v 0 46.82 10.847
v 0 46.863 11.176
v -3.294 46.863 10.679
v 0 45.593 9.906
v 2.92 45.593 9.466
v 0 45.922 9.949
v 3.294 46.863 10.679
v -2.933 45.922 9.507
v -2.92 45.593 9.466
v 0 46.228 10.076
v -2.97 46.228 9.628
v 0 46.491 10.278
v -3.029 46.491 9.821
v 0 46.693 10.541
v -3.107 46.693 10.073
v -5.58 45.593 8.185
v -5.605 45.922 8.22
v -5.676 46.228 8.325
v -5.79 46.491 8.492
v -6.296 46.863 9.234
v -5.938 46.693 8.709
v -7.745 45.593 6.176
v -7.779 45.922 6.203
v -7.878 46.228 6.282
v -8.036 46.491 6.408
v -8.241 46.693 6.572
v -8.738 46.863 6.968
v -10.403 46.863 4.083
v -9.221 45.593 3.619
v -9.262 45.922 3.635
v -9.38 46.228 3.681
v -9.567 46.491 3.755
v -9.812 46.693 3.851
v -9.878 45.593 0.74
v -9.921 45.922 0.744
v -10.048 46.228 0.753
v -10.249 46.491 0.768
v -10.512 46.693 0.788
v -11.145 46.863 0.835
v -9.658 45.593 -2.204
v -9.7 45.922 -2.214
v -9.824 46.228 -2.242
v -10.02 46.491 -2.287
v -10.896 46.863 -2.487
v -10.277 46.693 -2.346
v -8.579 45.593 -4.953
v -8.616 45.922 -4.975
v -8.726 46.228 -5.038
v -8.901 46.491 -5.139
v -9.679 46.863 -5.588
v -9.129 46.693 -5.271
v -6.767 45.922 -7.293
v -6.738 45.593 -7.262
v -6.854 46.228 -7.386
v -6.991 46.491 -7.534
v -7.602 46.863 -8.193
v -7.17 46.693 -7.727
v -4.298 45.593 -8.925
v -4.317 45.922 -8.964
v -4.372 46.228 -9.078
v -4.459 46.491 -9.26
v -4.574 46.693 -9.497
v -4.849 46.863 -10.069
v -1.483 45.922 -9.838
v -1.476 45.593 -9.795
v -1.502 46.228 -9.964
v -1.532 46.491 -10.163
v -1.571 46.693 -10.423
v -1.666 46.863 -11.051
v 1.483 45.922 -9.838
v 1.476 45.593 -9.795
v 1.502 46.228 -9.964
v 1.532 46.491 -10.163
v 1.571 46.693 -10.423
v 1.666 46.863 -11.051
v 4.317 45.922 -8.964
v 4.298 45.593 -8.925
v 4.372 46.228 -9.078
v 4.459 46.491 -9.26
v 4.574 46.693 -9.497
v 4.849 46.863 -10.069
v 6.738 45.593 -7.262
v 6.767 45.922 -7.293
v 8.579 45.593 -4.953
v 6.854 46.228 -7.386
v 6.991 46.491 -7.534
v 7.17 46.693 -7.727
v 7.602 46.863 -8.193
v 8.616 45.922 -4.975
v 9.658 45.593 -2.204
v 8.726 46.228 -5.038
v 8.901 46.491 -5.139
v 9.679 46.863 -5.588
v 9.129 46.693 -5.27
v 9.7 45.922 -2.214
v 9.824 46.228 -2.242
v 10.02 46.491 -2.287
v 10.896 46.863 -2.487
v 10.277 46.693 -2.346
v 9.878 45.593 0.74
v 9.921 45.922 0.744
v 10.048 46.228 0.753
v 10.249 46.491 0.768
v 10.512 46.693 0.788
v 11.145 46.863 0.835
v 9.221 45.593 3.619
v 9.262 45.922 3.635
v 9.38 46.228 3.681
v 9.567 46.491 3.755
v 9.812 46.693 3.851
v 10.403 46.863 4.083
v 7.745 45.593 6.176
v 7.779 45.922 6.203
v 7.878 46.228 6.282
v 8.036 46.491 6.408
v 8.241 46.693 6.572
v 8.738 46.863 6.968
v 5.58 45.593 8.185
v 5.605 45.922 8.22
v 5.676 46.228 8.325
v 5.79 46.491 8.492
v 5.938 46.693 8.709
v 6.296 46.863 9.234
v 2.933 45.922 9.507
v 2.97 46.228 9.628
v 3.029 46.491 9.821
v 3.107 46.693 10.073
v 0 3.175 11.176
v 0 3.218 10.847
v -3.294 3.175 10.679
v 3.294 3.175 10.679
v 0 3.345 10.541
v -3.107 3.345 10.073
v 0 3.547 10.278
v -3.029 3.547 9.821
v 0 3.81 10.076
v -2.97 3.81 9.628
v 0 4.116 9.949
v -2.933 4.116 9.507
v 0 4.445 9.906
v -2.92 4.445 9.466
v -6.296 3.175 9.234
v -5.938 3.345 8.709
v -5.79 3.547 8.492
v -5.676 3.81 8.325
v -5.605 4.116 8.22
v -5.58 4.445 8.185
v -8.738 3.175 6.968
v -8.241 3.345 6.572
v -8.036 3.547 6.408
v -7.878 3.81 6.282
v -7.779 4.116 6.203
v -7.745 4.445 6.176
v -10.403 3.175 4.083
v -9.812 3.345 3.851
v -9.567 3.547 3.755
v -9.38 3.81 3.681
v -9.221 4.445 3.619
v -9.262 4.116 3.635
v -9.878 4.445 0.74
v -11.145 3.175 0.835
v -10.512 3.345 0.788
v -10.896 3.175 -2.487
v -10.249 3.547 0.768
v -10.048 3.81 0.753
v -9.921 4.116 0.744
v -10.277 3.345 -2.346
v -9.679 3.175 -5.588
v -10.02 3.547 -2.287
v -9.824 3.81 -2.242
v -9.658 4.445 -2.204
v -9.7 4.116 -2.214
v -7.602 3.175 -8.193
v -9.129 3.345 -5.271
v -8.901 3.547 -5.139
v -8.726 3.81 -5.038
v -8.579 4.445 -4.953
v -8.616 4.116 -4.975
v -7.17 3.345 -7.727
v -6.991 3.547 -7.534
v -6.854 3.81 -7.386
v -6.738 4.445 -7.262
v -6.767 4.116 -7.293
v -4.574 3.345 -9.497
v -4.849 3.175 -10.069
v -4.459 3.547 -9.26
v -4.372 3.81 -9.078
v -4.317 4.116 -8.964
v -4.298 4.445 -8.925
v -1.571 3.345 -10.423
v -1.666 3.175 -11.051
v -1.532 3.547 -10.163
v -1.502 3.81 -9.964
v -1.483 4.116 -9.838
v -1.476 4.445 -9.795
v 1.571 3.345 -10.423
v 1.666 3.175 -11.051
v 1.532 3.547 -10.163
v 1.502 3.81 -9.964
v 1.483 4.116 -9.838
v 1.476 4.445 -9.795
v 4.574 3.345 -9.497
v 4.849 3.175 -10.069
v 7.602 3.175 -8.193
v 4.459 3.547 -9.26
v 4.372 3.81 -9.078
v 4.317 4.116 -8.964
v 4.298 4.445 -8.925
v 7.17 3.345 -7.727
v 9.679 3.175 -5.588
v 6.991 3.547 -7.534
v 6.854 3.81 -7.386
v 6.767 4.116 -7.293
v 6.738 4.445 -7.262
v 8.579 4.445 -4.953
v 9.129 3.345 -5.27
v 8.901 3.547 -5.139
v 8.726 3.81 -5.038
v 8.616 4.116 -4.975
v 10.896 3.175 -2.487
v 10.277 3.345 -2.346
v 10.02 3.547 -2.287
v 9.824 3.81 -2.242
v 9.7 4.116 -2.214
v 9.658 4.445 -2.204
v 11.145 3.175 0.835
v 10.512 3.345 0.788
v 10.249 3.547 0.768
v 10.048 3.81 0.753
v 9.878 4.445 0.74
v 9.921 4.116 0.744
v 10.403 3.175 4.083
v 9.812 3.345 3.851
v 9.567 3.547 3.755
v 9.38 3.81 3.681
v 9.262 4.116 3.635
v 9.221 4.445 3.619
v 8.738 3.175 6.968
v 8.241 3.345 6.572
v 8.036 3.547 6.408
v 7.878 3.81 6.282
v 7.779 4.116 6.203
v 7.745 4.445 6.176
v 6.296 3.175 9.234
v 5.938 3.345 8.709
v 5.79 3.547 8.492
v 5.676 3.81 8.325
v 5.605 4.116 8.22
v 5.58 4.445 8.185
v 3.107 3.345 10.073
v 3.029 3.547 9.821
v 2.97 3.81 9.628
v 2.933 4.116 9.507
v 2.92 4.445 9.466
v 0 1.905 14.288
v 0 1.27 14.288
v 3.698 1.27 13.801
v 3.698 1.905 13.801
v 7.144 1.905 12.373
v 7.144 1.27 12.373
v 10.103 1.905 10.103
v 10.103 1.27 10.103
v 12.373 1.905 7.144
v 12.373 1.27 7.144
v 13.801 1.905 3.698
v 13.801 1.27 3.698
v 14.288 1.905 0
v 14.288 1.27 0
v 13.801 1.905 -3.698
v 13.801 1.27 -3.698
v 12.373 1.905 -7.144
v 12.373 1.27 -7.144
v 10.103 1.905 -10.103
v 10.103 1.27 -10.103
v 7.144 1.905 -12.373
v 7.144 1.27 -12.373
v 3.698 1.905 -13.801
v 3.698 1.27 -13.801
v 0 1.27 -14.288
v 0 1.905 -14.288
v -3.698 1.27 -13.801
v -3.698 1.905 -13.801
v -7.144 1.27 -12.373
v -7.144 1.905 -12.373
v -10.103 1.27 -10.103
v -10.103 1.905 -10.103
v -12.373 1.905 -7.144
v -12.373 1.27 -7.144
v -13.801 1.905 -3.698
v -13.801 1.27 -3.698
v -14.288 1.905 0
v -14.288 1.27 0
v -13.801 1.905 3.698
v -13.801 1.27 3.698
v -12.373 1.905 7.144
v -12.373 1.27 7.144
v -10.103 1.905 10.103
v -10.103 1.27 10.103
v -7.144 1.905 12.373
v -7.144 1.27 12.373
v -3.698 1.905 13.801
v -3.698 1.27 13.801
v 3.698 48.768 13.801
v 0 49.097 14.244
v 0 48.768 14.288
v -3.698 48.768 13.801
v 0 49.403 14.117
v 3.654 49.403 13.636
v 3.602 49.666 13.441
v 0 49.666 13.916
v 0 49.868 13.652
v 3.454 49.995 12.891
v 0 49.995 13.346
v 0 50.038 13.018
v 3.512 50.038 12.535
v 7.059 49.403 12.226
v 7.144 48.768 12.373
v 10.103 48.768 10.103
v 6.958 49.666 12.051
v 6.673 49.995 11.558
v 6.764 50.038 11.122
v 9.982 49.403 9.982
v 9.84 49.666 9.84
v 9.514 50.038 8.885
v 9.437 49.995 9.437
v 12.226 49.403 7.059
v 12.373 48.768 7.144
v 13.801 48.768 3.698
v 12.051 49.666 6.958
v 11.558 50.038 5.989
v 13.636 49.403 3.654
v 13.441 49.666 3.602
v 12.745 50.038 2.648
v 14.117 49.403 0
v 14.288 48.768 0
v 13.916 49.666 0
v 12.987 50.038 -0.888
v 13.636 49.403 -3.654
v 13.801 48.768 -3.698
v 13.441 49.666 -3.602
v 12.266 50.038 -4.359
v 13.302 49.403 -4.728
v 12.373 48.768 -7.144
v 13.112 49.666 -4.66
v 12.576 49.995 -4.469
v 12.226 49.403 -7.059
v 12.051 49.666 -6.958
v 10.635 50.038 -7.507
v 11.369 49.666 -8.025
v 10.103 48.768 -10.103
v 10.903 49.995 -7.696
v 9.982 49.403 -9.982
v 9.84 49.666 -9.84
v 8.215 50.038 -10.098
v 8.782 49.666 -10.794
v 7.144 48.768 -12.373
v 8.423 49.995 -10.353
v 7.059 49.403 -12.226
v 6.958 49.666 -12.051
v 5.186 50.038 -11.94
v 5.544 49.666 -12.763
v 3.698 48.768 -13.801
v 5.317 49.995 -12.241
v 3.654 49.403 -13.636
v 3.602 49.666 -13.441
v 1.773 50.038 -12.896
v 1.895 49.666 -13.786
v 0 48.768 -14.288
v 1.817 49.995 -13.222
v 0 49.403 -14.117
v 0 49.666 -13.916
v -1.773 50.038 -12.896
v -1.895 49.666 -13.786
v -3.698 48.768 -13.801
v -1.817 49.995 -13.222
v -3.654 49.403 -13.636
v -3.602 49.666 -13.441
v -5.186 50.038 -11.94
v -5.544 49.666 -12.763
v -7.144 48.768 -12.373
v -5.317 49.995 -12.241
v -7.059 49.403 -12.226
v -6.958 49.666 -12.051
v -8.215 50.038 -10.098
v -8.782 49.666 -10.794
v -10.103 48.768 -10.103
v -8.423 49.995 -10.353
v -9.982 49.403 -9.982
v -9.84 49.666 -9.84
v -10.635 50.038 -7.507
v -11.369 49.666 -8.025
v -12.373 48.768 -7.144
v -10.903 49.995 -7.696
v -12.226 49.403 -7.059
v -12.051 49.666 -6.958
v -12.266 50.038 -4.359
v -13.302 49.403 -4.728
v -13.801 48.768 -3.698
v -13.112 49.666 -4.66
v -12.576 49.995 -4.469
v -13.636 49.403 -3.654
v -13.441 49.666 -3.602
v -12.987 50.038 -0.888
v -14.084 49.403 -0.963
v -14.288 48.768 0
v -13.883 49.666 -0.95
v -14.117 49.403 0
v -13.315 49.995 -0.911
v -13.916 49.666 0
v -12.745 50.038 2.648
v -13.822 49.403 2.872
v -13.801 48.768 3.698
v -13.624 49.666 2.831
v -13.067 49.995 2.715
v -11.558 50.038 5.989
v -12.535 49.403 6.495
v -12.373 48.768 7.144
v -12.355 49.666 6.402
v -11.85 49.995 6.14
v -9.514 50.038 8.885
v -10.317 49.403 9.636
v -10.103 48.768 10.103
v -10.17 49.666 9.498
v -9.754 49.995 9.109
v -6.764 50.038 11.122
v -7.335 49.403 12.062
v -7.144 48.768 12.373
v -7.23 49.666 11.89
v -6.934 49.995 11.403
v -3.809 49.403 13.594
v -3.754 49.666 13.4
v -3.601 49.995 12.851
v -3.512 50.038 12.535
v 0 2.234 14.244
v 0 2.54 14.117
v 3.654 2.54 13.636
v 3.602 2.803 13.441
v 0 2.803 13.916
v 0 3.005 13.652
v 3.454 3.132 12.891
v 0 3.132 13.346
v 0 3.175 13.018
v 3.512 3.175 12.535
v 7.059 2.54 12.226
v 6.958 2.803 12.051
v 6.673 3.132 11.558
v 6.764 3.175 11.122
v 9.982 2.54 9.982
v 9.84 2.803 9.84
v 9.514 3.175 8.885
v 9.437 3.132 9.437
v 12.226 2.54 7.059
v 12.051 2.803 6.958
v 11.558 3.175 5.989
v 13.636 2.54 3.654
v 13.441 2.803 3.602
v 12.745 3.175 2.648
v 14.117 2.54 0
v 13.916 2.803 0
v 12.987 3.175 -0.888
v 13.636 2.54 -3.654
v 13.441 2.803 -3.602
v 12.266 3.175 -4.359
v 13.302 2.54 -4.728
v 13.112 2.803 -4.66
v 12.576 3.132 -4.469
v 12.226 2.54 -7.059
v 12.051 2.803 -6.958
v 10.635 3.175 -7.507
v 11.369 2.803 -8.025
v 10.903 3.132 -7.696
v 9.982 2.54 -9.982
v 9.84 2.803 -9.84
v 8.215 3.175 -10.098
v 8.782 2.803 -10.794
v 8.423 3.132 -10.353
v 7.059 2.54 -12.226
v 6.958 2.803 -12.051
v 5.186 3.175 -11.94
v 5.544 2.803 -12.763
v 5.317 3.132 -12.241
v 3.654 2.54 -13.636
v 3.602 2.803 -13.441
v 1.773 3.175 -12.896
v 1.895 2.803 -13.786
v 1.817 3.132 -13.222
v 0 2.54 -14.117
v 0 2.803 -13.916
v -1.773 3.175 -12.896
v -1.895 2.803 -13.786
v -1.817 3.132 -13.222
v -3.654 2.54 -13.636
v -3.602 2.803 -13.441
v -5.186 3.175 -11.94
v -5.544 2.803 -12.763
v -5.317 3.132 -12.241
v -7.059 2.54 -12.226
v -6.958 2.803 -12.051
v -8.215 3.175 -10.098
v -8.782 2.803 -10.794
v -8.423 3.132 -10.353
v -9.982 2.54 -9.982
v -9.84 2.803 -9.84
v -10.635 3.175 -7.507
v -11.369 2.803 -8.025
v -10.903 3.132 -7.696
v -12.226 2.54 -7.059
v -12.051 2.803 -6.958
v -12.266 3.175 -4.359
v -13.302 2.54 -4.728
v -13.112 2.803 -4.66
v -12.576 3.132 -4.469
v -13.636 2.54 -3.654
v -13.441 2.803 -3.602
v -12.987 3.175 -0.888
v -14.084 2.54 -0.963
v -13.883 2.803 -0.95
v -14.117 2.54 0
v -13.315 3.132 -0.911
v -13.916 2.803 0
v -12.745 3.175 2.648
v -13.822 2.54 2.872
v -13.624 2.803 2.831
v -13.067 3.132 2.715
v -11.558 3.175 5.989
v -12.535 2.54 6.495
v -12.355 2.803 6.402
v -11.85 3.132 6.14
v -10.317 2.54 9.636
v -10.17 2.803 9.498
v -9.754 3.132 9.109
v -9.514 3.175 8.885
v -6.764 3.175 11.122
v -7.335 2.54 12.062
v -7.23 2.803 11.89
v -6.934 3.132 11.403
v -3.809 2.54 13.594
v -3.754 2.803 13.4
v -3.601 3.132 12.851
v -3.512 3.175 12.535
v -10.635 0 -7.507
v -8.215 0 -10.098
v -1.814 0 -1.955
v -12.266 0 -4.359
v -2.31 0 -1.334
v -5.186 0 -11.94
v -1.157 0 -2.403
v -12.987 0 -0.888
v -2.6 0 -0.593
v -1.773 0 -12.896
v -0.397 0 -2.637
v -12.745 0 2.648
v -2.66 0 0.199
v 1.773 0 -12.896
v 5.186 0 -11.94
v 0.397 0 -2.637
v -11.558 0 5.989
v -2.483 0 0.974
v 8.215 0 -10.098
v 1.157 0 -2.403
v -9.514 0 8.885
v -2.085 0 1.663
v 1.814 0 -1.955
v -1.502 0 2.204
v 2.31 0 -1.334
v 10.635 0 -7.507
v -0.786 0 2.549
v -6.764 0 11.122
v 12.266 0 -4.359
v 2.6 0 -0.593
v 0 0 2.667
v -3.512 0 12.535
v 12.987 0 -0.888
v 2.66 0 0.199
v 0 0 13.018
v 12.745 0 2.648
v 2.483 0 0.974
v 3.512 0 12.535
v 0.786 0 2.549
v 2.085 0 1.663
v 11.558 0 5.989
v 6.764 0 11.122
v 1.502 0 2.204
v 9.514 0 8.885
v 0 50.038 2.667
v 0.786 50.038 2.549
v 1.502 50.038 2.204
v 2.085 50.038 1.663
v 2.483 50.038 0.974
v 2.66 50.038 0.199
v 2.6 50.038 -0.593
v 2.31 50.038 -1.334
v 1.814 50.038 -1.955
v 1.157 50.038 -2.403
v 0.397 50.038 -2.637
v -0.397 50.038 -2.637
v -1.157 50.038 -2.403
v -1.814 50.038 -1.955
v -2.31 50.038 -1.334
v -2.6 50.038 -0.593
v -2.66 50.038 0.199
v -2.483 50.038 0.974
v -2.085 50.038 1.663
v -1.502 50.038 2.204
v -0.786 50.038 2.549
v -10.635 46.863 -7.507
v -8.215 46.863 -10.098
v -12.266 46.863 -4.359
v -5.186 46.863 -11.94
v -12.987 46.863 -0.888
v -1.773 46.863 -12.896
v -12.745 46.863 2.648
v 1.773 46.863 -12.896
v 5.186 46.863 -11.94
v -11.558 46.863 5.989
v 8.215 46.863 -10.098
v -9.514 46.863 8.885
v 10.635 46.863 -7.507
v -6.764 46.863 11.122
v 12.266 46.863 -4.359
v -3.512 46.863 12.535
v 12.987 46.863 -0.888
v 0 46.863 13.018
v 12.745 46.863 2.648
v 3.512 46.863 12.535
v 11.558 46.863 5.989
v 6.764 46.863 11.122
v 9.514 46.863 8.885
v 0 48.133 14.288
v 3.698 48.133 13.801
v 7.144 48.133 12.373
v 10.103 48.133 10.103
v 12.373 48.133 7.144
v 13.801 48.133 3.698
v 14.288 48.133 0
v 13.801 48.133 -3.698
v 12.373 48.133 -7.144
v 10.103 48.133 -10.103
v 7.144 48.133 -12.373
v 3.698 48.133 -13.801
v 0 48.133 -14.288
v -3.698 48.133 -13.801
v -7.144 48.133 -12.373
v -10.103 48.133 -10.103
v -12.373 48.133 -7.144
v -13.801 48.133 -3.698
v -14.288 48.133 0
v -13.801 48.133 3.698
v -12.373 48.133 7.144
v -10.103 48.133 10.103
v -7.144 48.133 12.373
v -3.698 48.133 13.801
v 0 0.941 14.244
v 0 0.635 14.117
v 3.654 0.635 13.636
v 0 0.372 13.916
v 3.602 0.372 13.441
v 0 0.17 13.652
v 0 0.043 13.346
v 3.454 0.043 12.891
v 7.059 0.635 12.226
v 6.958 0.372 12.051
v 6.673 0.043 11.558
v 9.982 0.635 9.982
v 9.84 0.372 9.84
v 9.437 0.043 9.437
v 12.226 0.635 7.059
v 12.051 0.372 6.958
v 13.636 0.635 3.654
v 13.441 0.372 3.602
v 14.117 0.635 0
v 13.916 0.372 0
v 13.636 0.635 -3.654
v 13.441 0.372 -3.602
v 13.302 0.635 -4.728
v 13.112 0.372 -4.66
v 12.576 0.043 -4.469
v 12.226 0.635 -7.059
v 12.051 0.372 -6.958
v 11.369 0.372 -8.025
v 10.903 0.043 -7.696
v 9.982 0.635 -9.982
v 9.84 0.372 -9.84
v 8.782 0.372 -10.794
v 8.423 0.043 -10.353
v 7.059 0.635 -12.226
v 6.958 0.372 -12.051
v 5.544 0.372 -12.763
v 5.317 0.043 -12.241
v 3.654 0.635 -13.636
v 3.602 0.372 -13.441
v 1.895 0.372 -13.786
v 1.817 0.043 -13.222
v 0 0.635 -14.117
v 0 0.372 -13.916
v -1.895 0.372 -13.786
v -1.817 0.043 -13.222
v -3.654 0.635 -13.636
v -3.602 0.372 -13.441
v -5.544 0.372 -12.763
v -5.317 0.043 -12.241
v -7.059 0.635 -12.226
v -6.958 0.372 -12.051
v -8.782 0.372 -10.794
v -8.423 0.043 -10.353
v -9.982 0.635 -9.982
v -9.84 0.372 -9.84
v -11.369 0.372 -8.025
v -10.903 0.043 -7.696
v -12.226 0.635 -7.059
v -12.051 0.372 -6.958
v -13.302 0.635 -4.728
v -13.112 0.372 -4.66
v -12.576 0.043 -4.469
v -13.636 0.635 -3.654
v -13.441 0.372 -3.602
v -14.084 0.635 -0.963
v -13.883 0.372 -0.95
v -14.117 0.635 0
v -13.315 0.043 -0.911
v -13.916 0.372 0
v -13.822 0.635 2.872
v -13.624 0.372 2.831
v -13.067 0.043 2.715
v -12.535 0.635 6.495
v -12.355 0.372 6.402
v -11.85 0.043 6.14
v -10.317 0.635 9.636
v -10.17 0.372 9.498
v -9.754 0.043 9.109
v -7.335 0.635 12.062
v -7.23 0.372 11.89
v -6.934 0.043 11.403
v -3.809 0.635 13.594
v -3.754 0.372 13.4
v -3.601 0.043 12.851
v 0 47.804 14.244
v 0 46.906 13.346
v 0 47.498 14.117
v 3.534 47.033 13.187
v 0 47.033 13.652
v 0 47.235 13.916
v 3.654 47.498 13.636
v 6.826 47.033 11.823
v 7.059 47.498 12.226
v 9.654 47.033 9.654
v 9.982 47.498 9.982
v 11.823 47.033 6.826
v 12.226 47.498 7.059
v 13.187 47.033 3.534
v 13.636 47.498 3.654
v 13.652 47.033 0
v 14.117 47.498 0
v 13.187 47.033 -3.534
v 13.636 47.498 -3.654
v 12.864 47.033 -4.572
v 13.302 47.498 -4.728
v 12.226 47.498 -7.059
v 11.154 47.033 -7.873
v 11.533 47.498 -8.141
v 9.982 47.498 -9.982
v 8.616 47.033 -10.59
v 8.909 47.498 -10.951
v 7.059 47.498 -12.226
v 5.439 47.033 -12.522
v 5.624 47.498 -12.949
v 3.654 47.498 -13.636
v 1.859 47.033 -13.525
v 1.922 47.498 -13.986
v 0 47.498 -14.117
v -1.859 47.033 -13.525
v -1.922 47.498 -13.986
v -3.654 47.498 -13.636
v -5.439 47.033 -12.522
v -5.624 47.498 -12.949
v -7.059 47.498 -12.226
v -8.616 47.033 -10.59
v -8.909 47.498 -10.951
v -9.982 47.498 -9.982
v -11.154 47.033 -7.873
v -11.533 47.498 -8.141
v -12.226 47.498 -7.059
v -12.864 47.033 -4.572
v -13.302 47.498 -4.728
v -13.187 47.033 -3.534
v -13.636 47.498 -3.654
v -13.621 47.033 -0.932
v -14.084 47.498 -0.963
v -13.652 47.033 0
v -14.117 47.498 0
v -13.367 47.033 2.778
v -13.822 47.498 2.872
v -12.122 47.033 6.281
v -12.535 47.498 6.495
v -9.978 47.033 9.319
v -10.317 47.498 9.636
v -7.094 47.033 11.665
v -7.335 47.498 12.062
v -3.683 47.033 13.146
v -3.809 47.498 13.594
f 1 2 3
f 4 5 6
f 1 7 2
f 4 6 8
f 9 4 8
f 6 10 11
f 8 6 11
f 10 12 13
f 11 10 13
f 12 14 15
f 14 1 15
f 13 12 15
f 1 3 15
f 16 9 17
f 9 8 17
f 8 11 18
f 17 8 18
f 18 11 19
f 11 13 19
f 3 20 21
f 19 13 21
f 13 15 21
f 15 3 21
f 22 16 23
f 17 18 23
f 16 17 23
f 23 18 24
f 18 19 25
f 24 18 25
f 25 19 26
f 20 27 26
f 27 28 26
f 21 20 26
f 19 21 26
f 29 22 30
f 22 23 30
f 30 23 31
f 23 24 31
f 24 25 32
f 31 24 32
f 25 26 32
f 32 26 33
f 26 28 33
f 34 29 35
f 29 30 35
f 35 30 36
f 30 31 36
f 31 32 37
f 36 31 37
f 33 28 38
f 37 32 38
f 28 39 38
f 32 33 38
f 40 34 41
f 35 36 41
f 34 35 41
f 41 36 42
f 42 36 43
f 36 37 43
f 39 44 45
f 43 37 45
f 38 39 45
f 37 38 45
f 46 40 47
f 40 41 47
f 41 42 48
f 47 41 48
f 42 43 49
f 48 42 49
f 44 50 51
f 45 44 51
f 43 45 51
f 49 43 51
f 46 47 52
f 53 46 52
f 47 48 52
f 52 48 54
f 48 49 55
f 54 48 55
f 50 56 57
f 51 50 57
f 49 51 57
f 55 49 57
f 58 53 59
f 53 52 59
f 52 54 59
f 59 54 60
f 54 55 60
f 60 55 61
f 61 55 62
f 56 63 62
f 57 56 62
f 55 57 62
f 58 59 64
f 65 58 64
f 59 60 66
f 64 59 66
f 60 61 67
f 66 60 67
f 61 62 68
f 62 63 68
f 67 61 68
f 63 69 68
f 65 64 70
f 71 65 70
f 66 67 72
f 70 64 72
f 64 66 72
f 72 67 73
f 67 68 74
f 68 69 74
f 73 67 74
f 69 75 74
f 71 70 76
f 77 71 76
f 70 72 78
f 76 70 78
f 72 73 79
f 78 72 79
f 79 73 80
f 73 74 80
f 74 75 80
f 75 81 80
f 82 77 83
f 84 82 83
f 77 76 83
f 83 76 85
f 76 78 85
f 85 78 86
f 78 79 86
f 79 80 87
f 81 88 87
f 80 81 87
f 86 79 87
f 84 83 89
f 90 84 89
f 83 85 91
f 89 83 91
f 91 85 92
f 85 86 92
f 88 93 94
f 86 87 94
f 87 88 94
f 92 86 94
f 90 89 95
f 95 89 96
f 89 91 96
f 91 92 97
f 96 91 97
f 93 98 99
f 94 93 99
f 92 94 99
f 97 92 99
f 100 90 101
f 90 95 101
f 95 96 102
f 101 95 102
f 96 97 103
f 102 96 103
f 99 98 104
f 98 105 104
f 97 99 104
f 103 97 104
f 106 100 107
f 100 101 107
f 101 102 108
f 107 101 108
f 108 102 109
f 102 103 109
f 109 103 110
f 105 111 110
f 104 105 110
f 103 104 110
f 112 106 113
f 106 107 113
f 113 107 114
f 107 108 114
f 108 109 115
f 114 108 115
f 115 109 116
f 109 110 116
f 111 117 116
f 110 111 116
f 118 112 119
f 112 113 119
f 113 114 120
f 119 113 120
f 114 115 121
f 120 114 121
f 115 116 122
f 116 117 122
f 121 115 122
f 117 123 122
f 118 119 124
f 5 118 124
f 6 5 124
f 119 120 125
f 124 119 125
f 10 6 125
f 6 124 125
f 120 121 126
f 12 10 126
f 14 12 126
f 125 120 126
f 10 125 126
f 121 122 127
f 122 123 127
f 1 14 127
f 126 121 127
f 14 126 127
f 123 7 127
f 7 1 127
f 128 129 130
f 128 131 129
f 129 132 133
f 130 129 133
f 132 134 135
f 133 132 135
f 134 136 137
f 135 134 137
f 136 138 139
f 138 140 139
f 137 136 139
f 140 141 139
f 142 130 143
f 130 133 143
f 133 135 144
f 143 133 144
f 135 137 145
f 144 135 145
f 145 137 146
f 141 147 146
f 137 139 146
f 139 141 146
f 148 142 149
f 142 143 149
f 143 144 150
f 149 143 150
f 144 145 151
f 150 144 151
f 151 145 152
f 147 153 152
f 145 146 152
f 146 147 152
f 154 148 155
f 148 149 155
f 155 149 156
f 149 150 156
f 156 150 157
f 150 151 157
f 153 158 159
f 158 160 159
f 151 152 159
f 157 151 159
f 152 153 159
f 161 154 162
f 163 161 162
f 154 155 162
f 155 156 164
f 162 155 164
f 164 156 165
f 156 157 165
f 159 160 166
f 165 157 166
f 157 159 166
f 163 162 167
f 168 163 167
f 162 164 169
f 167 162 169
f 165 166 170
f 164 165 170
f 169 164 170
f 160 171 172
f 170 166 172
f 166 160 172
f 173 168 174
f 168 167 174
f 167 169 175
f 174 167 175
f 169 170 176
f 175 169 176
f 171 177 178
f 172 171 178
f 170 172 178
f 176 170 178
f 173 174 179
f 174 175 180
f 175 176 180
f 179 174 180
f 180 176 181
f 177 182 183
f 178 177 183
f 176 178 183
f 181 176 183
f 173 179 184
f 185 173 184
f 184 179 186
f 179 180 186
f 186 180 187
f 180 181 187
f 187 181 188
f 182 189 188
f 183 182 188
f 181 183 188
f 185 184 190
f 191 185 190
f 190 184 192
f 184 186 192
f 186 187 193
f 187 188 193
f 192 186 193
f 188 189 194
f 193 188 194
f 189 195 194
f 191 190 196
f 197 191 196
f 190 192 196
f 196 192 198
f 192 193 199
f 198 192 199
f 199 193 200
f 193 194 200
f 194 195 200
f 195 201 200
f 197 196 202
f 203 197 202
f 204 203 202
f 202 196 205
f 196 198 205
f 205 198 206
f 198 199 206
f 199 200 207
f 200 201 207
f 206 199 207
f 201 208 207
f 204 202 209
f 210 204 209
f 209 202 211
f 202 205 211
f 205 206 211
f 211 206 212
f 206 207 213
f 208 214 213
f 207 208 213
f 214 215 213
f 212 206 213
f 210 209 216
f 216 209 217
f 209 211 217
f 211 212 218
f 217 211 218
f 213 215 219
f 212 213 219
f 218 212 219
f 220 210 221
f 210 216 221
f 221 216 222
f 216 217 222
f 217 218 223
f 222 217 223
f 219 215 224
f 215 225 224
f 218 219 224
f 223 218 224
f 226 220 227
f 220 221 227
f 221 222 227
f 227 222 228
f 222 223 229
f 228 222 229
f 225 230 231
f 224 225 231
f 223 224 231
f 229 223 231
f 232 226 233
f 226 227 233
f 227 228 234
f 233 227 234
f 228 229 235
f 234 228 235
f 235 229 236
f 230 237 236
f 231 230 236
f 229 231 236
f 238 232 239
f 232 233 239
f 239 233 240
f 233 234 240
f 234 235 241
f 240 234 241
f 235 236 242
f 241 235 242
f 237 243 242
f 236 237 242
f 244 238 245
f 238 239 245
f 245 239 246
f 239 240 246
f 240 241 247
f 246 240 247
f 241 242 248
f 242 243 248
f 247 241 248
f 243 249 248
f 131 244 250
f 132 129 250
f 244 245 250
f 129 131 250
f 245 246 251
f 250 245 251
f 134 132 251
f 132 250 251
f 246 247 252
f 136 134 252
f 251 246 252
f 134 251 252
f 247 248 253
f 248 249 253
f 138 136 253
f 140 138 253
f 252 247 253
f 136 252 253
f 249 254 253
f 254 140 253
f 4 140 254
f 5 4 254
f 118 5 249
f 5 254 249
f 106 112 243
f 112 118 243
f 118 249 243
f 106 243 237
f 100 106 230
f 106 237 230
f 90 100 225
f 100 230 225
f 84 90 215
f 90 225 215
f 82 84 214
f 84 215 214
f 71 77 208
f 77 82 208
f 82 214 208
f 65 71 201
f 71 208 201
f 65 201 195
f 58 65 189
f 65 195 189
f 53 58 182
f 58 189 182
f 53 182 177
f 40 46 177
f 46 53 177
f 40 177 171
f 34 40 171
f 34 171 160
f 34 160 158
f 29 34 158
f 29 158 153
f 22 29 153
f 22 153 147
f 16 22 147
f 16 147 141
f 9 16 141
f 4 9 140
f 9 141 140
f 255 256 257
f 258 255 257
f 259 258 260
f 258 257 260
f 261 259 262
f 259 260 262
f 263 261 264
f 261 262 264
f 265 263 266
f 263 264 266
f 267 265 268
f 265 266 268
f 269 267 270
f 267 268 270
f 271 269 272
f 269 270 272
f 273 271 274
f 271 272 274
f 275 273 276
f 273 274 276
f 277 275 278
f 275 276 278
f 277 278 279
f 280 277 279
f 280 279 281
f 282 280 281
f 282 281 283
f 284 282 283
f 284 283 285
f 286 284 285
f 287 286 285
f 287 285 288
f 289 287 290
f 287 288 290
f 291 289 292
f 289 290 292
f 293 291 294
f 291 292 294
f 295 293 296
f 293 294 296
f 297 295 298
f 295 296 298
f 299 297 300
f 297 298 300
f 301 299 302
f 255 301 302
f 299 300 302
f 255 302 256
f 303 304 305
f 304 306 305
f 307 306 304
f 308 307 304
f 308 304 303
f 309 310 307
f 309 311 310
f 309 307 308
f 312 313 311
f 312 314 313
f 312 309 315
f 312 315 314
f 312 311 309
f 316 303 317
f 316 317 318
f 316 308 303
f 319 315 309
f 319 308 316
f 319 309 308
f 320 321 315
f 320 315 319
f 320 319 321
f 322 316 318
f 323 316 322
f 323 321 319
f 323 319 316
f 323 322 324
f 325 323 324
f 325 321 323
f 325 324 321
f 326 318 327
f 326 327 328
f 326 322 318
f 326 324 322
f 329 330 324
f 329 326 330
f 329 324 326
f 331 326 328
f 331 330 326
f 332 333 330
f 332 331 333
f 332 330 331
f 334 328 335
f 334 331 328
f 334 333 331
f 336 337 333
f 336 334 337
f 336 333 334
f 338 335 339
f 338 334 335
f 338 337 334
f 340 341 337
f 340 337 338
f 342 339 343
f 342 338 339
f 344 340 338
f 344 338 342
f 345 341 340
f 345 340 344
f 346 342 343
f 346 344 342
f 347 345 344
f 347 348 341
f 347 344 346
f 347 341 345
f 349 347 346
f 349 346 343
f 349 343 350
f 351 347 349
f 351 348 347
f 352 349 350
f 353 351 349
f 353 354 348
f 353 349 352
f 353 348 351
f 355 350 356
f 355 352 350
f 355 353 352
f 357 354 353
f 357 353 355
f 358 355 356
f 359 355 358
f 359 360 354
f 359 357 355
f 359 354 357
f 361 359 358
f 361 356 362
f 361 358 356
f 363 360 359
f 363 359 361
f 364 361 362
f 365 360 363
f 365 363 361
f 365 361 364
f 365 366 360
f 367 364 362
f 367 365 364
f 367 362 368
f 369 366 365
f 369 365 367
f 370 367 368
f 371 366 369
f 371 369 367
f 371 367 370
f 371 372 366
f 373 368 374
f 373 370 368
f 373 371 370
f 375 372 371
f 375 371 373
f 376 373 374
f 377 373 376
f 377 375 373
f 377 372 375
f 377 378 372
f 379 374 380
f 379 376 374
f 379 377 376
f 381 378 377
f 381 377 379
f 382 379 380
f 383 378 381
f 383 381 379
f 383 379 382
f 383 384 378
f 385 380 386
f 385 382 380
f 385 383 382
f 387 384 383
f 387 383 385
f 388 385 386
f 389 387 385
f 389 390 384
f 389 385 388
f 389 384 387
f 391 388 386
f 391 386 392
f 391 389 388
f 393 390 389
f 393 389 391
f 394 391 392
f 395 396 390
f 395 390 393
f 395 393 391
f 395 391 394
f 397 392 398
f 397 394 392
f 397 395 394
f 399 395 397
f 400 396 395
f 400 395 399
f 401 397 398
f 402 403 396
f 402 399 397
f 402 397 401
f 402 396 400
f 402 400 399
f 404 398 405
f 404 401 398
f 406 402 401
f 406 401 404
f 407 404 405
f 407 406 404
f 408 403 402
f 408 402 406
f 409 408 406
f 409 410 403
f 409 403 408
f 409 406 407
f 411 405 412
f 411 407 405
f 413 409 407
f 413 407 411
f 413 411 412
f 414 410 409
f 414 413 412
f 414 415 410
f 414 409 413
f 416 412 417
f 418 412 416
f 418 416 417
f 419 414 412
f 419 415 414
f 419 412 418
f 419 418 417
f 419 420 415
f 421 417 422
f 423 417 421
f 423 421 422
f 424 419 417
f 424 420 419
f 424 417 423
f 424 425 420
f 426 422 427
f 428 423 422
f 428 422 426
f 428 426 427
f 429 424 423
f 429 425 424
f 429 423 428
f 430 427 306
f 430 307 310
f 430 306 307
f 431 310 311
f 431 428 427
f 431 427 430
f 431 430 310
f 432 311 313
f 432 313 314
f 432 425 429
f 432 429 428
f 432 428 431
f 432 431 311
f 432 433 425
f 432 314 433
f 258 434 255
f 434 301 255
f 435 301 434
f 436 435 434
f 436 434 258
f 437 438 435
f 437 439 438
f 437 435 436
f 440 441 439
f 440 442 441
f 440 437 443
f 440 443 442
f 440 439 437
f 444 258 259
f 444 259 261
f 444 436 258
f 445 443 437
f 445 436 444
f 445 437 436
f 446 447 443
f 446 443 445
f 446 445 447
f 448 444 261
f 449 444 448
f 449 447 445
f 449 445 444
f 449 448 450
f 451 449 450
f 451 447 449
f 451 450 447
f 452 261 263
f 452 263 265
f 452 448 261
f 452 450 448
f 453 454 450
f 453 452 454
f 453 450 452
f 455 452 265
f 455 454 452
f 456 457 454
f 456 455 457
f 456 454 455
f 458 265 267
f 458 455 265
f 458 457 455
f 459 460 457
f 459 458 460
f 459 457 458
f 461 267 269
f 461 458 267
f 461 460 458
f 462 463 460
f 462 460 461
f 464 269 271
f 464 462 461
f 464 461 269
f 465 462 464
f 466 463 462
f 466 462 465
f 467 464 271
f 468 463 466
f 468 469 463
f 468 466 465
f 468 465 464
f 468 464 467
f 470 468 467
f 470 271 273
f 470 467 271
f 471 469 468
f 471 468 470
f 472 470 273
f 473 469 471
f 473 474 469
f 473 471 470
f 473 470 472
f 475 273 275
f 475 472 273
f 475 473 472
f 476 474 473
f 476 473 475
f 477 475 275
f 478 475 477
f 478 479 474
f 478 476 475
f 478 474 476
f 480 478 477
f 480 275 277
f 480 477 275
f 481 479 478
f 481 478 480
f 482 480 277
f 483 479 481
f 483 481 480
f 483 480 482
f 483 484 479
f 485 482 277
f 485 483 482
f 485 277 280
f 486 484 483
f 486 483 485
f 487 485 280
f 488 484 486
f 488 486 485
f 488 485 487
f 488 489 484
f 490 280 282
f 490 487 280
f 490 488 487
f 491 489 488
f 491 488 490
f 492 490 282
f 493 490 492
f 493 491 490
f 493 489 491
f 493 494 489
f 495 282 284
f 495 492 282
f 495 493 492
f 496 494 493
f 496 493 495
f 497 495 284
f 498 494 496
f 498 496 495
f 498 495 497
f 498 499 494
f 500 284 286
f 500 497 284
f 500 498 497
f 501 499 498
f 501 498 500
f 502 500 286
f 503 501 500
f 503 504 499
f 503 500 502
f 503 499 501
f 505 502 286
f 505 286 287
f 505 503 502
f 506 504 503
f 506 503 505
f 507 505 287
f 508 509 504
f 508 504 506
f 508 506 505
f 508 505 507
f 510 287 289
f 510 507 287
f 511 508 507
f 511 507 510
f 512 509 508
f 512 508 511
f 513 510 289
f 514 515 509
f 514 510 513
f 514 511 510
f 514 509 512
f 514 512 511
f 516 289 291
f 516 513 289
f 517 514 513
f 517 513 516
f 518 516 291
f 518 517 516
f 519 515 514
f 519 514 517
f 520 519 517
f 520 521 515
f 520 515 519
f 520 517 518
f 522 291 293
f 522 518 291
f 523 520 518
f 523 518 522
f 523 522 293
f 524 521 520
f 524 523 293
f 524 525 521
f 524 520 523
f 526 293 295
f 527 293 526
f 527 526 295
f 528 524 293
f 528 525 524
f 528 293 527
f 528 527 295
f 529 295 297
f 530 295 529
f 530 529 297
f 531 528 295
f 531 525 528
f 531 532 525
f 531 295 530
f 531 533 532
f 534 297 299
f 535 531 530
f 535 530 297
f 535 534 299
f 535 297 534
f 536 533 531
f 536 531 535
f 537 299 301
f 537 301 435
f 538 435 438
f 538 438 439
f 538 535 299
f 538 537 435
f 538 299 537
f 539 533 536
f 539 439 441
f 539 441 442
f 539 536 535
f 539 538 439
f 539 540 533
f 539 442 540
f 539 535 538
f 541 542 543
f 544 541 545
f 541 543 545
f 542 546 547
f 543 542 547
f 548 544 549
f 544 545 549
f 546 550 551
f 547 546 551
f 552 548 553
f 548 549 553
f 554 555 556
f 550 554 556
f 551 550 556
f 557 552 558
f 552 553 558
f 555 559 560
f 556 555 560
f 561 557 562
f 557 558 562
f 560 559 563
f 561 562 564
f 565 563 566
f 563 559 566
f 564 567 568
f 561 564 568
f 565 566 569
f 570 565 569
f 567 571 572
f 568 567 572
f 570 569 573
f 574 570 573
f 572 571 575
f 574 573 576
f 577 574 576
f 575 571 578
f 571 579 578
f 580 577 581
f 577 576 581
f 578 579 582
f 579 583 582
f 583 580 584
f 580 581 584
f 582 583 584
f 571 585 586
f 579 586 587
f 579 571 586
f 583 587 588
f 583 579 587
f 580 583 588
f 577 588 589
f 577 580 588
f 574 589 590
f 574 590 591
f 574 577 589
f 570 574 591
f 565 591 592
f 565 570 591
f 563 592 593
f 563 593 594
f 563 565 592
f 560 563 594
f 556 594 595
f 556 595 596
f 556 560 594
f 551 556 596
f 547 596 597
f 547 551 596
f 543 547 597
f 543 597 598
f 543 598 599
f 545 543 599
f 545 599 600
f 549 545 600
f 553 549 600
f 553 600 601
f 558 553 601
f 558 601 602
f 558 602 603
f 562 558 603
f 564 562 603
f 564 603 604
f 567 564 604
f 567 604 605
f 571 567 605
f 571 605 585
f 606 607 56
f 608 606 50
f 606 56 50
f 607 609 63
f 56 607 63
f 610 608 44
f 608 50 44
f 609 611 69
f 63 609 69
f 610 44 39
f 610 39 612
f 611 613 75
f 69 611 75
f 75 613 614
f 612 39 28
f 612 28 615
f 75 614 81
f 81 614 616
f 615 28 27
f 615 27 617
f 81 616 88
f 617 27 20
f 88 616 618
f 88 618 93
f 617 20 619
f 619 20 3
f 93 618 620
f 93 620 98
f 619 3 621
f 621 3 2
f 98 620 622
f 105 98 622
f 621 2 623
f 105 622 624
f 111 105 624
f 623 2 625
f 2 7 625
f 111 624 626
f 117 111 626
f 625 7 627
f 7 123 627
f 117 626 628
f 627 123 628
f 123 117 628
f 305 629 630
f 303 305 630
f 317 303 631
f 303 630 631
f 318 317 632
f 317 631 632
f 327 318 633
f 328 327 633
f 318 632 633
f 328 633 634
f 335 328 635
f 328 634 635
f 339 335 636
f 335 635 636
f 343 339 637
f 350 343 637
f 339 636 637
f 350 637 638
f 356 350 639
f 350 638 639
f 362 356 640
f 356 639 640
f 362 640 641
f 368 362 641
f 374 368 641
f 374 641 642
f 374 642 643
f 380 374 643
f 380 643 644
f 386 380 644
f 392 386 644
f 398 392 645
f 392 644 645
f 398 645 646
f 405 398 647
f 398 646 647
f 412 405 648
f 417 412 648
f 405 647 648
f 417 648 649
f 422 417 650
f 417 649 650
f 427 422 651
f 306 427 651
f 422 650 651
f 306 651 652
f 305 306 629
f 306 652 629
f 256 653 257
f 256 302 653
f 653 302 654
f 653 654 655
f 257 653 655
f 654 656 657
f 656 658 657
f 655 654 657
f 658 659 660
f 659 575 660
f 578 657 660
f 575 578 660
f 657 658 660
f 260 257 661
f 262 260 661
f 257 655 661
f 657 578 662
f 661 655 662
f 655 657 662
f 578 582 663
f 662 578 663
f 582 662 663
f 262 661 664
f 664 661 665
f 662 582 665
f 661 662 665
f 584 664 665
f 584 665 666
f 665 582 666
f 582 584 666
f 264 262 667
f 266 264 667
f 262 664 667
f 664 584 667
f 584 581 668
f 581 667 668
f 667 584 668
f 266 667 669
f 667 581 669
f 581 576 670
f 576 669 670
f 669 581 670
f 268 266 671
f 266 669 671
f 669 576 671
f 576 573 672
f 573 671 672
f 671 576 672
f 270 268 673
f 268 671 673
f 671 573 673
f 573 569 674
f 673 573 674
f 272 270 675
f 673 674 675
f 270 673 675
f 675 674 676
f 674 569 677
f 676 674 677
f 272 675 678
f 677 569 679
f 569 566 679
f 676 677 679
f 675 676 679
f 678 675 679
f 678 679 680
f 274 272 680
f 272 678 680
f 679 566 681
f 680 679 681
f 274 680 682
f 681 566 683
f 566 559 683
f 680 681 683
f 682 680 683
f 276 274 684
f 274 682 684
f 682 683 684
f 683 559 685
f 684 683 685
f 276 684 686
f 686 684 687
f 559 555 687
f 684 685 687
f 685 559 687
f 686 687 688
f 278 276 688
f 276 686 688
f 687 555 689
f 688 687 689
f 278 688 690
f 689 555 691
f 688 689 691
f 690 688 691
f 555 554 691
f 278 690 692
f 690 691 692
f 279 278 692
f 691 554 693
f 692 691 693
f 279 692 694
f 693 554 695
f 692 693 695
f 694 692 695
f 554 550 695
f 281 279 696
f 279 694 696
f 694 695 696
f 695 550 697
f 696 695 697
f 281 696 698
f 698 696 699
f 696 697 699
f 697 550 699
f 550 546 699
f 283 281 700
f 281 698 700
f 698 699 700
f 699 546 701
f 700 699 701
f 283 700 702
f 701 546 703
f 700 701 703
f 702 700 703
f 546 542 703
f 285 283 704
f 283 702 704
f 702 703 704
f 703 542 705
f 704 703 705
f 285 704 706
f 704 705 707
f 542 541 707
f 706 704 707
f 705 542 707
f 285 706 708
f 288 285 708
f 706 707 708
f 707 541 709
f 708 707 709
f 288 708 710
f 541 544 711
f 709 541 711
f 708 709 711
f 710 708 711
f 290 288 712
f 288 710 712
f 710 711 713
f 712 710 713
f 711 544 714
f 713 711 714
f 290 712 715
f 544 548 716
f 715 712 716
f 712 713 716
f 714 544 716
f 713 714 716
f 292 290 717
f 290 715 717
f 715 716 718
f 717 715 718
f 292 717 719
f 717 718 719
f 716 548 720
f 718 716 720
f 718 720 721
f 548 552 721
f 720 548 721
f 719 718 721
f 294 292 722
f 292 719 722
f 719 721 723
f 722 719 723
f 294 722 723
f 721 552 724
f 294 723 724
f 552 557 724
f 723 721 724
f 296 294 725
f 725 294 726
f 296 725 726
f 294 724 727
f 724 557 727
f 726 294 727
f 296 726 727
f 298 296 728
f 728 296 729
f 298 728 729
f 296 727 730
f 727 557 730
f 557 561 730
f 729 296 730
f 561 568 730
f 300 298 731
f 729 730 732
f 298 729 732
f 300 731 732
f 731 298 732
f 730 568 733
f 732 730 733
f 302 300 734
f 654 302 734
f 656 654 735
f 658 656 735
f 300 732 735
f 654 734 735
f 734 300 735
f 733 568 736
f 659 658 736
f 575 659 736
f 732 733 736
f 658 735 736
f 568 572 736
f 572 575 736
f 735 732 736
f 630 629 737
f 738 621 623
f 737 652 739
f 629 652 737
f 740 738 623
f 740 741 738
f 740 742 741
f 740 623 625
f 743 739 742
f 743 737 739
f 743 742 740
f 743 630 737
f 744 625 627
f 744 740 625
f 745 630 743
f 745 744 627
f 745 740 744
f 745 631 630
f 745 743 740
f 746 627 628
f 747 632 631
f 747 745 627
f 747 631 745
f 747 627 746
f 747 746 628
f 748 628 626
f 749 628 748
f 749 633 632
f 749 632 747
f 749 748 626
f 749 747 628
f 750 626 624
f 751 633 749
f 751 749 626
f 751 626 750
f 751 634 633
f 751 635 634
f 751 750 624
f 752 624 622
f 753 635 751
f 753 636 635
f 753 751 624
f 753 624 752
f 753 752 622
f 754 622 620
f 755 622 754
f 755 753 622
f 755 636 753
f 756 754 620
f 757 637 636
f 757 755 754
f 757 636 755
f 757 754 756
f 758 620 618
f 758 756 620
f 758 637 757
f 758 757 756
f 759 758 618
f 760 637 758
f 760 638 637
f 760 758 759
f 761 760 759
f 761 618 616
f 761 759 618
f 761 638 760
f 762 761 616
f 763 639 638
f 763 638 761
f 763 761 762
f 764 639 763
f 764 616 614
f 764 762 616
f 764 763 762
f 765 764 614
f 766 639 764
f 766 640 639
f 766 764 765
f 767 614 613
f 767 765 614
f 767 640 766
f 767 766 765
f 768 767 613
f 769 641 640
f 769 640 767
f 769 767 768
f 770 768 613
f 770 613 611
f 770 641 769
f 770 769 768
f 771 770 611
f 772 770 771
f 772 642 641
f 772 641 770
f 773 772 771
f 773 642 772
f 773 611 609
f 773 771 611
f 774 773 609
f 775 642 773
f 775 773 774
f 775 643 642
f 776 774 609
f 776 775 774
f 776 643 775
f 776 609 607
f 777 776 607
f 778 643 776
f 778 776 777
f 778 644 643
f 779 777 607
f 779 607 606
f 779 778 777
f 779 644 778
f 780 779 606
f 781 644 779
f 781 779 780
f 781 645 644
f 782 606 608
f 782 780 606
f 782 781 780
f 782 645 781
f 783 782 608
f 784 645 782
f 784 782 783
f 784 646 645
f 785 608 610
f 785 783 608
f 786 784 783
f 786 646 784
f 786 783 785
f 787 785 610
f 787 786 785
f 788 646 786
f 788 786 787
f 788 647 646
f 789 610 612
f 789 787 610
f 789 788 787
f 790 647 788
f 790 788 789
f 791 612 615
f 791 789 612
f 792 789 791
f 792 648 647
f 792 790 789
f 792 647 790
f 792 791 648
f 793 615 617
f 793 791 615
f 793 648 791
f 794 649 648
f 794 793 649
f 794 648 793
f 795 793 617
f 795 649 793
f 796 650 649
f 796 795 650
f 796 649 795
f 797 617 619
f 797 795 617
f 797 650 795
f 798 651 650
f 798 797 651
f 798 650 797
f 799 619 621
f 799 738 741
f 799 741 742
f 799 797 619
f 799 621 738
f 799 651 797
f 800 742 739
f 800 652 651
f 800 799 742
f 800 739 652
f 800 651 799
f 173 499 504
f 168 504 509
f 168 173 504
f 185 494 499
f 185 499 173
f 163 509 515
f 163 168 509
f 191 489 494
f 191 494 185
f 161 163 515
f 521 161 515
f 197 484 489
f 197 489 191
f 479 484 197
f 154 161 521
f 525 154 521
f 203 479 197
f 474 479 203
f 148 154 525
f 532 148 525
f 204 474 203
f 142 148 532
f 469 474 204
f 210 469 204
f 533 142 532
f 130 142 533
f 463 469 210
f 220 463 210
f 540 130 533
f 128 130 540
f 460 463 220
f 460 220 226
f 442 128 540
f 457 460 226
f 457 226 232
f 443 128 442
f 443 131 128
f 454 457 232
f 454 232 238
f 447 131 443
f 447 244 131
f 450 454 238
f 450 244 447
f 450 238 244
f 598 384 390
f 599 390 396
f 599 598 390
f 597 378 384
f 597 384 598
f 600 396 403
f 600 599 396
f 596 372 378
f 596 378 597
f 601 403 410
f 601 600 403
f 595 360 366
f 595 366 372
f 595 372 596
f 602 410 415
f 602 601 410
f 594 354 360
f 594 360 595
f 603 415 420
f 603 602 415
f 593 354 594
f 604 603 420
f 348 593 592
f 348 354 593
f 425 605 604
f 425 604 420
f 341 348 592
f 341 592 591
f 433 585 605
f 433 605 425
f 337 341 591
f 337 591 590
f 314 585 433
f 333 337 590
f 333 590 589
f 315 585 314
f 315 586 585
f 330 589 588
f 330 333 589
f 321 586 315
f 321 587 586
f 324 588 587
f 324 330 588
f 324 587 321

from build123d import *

# Parameters (mm, degrees)
SKETCH2_R           = 9.906
SKETCH2_R_2         = 2.667
BOSS_EXTRUDE1_DEPTH = 50.038
BOSS_EXTRUDE2_START = -3.175
SKETCH3_R           = 14.2875
SKETCH3_R_2         = 2.667
BOSS_EXTRUDE2_DEPTH = 3.175
BOSS_EXTRUDE3_START = -50.038
SKETCH3_2_R         = 14.2875
SKETCH3_2_R_2       = 2.667
BOSS_EXTRUDE3_DEPTH = 3.175
FILLET1_R           = 1.27


with BuildPart() as part:
    # Sketch2 → Boss-Extrude1 (new body)
    with BuildSketch(Plane(origin=(0, 0, 0), x_dir=(1, 0, 0), z_dir=(0, 1, 0))):
        with Locations(Location((0, 0, 0), (0, 0, 270))):
            Circle(SKETCH2_R)
        with Locations(Location((0, 0, 0), (0, 0, 270))):
            Circle(SKETCH2_R_2, mode=Mode.SUBTRACT)
    extrude(amount=BOSS_EXTRUDE1_DEPTH)

    # Sketch3 → Boss-Extrude2 (add)
    with BuildSketch(Plane(origin=(0, 50.038, 0), x_dir=(1, 0, 0), z_dir=(0, 1, 0)).offset(BOSS_EXTRUDE2_START)):
        with Locations(Location((0, 0, 0), (0, 0, 270))):
            Circle(SKETCH3_R)
        with Locations(Location((0, 0, 0), (0, 0, 270))):
            Circle(SKETCH3_R_2, mode=Mode.SUBTRACT)
    extrude(amount=BOSS_EXTRUDE2_DEPTH)

    # Sketch3<2> → Boss-Extrude3 (add)
    with BuildSketch(Plane(origin=(0, 50.038, 0), x_dir=(1, 0, 0), z_dir=(0, 1, 0)).offset(BOSS_EXTRUDE3_START)):
        with Locations(Location((0, 0, 0), (0, 0, 270))):
            Circle(SKETCH3_2_R)
        with Locations(Location((0, 0, 0), (0, 0, 270))):
            Circle(SKETCH3_2_R_2, mode=Mode.SUBTRACT)
    extrude(amount=BOSS_EXTRUDE3_DEPTH)

    # Fillet1
    fillet1_edges = [part.edges().sort_by_distance(p)[0] for p in [
        (0, 46.863, -9.906),
        (0, 50.038, -14.2875),
        (0, 46.863, -14.2875),
        (0, 3.175, -14.2875),
        (0, 3.175, -9.906),
        (0, 0, -14.2875),
    ]]
    fillet(fillet1_edges, radius=FILLET1_R)


solid = part.part
